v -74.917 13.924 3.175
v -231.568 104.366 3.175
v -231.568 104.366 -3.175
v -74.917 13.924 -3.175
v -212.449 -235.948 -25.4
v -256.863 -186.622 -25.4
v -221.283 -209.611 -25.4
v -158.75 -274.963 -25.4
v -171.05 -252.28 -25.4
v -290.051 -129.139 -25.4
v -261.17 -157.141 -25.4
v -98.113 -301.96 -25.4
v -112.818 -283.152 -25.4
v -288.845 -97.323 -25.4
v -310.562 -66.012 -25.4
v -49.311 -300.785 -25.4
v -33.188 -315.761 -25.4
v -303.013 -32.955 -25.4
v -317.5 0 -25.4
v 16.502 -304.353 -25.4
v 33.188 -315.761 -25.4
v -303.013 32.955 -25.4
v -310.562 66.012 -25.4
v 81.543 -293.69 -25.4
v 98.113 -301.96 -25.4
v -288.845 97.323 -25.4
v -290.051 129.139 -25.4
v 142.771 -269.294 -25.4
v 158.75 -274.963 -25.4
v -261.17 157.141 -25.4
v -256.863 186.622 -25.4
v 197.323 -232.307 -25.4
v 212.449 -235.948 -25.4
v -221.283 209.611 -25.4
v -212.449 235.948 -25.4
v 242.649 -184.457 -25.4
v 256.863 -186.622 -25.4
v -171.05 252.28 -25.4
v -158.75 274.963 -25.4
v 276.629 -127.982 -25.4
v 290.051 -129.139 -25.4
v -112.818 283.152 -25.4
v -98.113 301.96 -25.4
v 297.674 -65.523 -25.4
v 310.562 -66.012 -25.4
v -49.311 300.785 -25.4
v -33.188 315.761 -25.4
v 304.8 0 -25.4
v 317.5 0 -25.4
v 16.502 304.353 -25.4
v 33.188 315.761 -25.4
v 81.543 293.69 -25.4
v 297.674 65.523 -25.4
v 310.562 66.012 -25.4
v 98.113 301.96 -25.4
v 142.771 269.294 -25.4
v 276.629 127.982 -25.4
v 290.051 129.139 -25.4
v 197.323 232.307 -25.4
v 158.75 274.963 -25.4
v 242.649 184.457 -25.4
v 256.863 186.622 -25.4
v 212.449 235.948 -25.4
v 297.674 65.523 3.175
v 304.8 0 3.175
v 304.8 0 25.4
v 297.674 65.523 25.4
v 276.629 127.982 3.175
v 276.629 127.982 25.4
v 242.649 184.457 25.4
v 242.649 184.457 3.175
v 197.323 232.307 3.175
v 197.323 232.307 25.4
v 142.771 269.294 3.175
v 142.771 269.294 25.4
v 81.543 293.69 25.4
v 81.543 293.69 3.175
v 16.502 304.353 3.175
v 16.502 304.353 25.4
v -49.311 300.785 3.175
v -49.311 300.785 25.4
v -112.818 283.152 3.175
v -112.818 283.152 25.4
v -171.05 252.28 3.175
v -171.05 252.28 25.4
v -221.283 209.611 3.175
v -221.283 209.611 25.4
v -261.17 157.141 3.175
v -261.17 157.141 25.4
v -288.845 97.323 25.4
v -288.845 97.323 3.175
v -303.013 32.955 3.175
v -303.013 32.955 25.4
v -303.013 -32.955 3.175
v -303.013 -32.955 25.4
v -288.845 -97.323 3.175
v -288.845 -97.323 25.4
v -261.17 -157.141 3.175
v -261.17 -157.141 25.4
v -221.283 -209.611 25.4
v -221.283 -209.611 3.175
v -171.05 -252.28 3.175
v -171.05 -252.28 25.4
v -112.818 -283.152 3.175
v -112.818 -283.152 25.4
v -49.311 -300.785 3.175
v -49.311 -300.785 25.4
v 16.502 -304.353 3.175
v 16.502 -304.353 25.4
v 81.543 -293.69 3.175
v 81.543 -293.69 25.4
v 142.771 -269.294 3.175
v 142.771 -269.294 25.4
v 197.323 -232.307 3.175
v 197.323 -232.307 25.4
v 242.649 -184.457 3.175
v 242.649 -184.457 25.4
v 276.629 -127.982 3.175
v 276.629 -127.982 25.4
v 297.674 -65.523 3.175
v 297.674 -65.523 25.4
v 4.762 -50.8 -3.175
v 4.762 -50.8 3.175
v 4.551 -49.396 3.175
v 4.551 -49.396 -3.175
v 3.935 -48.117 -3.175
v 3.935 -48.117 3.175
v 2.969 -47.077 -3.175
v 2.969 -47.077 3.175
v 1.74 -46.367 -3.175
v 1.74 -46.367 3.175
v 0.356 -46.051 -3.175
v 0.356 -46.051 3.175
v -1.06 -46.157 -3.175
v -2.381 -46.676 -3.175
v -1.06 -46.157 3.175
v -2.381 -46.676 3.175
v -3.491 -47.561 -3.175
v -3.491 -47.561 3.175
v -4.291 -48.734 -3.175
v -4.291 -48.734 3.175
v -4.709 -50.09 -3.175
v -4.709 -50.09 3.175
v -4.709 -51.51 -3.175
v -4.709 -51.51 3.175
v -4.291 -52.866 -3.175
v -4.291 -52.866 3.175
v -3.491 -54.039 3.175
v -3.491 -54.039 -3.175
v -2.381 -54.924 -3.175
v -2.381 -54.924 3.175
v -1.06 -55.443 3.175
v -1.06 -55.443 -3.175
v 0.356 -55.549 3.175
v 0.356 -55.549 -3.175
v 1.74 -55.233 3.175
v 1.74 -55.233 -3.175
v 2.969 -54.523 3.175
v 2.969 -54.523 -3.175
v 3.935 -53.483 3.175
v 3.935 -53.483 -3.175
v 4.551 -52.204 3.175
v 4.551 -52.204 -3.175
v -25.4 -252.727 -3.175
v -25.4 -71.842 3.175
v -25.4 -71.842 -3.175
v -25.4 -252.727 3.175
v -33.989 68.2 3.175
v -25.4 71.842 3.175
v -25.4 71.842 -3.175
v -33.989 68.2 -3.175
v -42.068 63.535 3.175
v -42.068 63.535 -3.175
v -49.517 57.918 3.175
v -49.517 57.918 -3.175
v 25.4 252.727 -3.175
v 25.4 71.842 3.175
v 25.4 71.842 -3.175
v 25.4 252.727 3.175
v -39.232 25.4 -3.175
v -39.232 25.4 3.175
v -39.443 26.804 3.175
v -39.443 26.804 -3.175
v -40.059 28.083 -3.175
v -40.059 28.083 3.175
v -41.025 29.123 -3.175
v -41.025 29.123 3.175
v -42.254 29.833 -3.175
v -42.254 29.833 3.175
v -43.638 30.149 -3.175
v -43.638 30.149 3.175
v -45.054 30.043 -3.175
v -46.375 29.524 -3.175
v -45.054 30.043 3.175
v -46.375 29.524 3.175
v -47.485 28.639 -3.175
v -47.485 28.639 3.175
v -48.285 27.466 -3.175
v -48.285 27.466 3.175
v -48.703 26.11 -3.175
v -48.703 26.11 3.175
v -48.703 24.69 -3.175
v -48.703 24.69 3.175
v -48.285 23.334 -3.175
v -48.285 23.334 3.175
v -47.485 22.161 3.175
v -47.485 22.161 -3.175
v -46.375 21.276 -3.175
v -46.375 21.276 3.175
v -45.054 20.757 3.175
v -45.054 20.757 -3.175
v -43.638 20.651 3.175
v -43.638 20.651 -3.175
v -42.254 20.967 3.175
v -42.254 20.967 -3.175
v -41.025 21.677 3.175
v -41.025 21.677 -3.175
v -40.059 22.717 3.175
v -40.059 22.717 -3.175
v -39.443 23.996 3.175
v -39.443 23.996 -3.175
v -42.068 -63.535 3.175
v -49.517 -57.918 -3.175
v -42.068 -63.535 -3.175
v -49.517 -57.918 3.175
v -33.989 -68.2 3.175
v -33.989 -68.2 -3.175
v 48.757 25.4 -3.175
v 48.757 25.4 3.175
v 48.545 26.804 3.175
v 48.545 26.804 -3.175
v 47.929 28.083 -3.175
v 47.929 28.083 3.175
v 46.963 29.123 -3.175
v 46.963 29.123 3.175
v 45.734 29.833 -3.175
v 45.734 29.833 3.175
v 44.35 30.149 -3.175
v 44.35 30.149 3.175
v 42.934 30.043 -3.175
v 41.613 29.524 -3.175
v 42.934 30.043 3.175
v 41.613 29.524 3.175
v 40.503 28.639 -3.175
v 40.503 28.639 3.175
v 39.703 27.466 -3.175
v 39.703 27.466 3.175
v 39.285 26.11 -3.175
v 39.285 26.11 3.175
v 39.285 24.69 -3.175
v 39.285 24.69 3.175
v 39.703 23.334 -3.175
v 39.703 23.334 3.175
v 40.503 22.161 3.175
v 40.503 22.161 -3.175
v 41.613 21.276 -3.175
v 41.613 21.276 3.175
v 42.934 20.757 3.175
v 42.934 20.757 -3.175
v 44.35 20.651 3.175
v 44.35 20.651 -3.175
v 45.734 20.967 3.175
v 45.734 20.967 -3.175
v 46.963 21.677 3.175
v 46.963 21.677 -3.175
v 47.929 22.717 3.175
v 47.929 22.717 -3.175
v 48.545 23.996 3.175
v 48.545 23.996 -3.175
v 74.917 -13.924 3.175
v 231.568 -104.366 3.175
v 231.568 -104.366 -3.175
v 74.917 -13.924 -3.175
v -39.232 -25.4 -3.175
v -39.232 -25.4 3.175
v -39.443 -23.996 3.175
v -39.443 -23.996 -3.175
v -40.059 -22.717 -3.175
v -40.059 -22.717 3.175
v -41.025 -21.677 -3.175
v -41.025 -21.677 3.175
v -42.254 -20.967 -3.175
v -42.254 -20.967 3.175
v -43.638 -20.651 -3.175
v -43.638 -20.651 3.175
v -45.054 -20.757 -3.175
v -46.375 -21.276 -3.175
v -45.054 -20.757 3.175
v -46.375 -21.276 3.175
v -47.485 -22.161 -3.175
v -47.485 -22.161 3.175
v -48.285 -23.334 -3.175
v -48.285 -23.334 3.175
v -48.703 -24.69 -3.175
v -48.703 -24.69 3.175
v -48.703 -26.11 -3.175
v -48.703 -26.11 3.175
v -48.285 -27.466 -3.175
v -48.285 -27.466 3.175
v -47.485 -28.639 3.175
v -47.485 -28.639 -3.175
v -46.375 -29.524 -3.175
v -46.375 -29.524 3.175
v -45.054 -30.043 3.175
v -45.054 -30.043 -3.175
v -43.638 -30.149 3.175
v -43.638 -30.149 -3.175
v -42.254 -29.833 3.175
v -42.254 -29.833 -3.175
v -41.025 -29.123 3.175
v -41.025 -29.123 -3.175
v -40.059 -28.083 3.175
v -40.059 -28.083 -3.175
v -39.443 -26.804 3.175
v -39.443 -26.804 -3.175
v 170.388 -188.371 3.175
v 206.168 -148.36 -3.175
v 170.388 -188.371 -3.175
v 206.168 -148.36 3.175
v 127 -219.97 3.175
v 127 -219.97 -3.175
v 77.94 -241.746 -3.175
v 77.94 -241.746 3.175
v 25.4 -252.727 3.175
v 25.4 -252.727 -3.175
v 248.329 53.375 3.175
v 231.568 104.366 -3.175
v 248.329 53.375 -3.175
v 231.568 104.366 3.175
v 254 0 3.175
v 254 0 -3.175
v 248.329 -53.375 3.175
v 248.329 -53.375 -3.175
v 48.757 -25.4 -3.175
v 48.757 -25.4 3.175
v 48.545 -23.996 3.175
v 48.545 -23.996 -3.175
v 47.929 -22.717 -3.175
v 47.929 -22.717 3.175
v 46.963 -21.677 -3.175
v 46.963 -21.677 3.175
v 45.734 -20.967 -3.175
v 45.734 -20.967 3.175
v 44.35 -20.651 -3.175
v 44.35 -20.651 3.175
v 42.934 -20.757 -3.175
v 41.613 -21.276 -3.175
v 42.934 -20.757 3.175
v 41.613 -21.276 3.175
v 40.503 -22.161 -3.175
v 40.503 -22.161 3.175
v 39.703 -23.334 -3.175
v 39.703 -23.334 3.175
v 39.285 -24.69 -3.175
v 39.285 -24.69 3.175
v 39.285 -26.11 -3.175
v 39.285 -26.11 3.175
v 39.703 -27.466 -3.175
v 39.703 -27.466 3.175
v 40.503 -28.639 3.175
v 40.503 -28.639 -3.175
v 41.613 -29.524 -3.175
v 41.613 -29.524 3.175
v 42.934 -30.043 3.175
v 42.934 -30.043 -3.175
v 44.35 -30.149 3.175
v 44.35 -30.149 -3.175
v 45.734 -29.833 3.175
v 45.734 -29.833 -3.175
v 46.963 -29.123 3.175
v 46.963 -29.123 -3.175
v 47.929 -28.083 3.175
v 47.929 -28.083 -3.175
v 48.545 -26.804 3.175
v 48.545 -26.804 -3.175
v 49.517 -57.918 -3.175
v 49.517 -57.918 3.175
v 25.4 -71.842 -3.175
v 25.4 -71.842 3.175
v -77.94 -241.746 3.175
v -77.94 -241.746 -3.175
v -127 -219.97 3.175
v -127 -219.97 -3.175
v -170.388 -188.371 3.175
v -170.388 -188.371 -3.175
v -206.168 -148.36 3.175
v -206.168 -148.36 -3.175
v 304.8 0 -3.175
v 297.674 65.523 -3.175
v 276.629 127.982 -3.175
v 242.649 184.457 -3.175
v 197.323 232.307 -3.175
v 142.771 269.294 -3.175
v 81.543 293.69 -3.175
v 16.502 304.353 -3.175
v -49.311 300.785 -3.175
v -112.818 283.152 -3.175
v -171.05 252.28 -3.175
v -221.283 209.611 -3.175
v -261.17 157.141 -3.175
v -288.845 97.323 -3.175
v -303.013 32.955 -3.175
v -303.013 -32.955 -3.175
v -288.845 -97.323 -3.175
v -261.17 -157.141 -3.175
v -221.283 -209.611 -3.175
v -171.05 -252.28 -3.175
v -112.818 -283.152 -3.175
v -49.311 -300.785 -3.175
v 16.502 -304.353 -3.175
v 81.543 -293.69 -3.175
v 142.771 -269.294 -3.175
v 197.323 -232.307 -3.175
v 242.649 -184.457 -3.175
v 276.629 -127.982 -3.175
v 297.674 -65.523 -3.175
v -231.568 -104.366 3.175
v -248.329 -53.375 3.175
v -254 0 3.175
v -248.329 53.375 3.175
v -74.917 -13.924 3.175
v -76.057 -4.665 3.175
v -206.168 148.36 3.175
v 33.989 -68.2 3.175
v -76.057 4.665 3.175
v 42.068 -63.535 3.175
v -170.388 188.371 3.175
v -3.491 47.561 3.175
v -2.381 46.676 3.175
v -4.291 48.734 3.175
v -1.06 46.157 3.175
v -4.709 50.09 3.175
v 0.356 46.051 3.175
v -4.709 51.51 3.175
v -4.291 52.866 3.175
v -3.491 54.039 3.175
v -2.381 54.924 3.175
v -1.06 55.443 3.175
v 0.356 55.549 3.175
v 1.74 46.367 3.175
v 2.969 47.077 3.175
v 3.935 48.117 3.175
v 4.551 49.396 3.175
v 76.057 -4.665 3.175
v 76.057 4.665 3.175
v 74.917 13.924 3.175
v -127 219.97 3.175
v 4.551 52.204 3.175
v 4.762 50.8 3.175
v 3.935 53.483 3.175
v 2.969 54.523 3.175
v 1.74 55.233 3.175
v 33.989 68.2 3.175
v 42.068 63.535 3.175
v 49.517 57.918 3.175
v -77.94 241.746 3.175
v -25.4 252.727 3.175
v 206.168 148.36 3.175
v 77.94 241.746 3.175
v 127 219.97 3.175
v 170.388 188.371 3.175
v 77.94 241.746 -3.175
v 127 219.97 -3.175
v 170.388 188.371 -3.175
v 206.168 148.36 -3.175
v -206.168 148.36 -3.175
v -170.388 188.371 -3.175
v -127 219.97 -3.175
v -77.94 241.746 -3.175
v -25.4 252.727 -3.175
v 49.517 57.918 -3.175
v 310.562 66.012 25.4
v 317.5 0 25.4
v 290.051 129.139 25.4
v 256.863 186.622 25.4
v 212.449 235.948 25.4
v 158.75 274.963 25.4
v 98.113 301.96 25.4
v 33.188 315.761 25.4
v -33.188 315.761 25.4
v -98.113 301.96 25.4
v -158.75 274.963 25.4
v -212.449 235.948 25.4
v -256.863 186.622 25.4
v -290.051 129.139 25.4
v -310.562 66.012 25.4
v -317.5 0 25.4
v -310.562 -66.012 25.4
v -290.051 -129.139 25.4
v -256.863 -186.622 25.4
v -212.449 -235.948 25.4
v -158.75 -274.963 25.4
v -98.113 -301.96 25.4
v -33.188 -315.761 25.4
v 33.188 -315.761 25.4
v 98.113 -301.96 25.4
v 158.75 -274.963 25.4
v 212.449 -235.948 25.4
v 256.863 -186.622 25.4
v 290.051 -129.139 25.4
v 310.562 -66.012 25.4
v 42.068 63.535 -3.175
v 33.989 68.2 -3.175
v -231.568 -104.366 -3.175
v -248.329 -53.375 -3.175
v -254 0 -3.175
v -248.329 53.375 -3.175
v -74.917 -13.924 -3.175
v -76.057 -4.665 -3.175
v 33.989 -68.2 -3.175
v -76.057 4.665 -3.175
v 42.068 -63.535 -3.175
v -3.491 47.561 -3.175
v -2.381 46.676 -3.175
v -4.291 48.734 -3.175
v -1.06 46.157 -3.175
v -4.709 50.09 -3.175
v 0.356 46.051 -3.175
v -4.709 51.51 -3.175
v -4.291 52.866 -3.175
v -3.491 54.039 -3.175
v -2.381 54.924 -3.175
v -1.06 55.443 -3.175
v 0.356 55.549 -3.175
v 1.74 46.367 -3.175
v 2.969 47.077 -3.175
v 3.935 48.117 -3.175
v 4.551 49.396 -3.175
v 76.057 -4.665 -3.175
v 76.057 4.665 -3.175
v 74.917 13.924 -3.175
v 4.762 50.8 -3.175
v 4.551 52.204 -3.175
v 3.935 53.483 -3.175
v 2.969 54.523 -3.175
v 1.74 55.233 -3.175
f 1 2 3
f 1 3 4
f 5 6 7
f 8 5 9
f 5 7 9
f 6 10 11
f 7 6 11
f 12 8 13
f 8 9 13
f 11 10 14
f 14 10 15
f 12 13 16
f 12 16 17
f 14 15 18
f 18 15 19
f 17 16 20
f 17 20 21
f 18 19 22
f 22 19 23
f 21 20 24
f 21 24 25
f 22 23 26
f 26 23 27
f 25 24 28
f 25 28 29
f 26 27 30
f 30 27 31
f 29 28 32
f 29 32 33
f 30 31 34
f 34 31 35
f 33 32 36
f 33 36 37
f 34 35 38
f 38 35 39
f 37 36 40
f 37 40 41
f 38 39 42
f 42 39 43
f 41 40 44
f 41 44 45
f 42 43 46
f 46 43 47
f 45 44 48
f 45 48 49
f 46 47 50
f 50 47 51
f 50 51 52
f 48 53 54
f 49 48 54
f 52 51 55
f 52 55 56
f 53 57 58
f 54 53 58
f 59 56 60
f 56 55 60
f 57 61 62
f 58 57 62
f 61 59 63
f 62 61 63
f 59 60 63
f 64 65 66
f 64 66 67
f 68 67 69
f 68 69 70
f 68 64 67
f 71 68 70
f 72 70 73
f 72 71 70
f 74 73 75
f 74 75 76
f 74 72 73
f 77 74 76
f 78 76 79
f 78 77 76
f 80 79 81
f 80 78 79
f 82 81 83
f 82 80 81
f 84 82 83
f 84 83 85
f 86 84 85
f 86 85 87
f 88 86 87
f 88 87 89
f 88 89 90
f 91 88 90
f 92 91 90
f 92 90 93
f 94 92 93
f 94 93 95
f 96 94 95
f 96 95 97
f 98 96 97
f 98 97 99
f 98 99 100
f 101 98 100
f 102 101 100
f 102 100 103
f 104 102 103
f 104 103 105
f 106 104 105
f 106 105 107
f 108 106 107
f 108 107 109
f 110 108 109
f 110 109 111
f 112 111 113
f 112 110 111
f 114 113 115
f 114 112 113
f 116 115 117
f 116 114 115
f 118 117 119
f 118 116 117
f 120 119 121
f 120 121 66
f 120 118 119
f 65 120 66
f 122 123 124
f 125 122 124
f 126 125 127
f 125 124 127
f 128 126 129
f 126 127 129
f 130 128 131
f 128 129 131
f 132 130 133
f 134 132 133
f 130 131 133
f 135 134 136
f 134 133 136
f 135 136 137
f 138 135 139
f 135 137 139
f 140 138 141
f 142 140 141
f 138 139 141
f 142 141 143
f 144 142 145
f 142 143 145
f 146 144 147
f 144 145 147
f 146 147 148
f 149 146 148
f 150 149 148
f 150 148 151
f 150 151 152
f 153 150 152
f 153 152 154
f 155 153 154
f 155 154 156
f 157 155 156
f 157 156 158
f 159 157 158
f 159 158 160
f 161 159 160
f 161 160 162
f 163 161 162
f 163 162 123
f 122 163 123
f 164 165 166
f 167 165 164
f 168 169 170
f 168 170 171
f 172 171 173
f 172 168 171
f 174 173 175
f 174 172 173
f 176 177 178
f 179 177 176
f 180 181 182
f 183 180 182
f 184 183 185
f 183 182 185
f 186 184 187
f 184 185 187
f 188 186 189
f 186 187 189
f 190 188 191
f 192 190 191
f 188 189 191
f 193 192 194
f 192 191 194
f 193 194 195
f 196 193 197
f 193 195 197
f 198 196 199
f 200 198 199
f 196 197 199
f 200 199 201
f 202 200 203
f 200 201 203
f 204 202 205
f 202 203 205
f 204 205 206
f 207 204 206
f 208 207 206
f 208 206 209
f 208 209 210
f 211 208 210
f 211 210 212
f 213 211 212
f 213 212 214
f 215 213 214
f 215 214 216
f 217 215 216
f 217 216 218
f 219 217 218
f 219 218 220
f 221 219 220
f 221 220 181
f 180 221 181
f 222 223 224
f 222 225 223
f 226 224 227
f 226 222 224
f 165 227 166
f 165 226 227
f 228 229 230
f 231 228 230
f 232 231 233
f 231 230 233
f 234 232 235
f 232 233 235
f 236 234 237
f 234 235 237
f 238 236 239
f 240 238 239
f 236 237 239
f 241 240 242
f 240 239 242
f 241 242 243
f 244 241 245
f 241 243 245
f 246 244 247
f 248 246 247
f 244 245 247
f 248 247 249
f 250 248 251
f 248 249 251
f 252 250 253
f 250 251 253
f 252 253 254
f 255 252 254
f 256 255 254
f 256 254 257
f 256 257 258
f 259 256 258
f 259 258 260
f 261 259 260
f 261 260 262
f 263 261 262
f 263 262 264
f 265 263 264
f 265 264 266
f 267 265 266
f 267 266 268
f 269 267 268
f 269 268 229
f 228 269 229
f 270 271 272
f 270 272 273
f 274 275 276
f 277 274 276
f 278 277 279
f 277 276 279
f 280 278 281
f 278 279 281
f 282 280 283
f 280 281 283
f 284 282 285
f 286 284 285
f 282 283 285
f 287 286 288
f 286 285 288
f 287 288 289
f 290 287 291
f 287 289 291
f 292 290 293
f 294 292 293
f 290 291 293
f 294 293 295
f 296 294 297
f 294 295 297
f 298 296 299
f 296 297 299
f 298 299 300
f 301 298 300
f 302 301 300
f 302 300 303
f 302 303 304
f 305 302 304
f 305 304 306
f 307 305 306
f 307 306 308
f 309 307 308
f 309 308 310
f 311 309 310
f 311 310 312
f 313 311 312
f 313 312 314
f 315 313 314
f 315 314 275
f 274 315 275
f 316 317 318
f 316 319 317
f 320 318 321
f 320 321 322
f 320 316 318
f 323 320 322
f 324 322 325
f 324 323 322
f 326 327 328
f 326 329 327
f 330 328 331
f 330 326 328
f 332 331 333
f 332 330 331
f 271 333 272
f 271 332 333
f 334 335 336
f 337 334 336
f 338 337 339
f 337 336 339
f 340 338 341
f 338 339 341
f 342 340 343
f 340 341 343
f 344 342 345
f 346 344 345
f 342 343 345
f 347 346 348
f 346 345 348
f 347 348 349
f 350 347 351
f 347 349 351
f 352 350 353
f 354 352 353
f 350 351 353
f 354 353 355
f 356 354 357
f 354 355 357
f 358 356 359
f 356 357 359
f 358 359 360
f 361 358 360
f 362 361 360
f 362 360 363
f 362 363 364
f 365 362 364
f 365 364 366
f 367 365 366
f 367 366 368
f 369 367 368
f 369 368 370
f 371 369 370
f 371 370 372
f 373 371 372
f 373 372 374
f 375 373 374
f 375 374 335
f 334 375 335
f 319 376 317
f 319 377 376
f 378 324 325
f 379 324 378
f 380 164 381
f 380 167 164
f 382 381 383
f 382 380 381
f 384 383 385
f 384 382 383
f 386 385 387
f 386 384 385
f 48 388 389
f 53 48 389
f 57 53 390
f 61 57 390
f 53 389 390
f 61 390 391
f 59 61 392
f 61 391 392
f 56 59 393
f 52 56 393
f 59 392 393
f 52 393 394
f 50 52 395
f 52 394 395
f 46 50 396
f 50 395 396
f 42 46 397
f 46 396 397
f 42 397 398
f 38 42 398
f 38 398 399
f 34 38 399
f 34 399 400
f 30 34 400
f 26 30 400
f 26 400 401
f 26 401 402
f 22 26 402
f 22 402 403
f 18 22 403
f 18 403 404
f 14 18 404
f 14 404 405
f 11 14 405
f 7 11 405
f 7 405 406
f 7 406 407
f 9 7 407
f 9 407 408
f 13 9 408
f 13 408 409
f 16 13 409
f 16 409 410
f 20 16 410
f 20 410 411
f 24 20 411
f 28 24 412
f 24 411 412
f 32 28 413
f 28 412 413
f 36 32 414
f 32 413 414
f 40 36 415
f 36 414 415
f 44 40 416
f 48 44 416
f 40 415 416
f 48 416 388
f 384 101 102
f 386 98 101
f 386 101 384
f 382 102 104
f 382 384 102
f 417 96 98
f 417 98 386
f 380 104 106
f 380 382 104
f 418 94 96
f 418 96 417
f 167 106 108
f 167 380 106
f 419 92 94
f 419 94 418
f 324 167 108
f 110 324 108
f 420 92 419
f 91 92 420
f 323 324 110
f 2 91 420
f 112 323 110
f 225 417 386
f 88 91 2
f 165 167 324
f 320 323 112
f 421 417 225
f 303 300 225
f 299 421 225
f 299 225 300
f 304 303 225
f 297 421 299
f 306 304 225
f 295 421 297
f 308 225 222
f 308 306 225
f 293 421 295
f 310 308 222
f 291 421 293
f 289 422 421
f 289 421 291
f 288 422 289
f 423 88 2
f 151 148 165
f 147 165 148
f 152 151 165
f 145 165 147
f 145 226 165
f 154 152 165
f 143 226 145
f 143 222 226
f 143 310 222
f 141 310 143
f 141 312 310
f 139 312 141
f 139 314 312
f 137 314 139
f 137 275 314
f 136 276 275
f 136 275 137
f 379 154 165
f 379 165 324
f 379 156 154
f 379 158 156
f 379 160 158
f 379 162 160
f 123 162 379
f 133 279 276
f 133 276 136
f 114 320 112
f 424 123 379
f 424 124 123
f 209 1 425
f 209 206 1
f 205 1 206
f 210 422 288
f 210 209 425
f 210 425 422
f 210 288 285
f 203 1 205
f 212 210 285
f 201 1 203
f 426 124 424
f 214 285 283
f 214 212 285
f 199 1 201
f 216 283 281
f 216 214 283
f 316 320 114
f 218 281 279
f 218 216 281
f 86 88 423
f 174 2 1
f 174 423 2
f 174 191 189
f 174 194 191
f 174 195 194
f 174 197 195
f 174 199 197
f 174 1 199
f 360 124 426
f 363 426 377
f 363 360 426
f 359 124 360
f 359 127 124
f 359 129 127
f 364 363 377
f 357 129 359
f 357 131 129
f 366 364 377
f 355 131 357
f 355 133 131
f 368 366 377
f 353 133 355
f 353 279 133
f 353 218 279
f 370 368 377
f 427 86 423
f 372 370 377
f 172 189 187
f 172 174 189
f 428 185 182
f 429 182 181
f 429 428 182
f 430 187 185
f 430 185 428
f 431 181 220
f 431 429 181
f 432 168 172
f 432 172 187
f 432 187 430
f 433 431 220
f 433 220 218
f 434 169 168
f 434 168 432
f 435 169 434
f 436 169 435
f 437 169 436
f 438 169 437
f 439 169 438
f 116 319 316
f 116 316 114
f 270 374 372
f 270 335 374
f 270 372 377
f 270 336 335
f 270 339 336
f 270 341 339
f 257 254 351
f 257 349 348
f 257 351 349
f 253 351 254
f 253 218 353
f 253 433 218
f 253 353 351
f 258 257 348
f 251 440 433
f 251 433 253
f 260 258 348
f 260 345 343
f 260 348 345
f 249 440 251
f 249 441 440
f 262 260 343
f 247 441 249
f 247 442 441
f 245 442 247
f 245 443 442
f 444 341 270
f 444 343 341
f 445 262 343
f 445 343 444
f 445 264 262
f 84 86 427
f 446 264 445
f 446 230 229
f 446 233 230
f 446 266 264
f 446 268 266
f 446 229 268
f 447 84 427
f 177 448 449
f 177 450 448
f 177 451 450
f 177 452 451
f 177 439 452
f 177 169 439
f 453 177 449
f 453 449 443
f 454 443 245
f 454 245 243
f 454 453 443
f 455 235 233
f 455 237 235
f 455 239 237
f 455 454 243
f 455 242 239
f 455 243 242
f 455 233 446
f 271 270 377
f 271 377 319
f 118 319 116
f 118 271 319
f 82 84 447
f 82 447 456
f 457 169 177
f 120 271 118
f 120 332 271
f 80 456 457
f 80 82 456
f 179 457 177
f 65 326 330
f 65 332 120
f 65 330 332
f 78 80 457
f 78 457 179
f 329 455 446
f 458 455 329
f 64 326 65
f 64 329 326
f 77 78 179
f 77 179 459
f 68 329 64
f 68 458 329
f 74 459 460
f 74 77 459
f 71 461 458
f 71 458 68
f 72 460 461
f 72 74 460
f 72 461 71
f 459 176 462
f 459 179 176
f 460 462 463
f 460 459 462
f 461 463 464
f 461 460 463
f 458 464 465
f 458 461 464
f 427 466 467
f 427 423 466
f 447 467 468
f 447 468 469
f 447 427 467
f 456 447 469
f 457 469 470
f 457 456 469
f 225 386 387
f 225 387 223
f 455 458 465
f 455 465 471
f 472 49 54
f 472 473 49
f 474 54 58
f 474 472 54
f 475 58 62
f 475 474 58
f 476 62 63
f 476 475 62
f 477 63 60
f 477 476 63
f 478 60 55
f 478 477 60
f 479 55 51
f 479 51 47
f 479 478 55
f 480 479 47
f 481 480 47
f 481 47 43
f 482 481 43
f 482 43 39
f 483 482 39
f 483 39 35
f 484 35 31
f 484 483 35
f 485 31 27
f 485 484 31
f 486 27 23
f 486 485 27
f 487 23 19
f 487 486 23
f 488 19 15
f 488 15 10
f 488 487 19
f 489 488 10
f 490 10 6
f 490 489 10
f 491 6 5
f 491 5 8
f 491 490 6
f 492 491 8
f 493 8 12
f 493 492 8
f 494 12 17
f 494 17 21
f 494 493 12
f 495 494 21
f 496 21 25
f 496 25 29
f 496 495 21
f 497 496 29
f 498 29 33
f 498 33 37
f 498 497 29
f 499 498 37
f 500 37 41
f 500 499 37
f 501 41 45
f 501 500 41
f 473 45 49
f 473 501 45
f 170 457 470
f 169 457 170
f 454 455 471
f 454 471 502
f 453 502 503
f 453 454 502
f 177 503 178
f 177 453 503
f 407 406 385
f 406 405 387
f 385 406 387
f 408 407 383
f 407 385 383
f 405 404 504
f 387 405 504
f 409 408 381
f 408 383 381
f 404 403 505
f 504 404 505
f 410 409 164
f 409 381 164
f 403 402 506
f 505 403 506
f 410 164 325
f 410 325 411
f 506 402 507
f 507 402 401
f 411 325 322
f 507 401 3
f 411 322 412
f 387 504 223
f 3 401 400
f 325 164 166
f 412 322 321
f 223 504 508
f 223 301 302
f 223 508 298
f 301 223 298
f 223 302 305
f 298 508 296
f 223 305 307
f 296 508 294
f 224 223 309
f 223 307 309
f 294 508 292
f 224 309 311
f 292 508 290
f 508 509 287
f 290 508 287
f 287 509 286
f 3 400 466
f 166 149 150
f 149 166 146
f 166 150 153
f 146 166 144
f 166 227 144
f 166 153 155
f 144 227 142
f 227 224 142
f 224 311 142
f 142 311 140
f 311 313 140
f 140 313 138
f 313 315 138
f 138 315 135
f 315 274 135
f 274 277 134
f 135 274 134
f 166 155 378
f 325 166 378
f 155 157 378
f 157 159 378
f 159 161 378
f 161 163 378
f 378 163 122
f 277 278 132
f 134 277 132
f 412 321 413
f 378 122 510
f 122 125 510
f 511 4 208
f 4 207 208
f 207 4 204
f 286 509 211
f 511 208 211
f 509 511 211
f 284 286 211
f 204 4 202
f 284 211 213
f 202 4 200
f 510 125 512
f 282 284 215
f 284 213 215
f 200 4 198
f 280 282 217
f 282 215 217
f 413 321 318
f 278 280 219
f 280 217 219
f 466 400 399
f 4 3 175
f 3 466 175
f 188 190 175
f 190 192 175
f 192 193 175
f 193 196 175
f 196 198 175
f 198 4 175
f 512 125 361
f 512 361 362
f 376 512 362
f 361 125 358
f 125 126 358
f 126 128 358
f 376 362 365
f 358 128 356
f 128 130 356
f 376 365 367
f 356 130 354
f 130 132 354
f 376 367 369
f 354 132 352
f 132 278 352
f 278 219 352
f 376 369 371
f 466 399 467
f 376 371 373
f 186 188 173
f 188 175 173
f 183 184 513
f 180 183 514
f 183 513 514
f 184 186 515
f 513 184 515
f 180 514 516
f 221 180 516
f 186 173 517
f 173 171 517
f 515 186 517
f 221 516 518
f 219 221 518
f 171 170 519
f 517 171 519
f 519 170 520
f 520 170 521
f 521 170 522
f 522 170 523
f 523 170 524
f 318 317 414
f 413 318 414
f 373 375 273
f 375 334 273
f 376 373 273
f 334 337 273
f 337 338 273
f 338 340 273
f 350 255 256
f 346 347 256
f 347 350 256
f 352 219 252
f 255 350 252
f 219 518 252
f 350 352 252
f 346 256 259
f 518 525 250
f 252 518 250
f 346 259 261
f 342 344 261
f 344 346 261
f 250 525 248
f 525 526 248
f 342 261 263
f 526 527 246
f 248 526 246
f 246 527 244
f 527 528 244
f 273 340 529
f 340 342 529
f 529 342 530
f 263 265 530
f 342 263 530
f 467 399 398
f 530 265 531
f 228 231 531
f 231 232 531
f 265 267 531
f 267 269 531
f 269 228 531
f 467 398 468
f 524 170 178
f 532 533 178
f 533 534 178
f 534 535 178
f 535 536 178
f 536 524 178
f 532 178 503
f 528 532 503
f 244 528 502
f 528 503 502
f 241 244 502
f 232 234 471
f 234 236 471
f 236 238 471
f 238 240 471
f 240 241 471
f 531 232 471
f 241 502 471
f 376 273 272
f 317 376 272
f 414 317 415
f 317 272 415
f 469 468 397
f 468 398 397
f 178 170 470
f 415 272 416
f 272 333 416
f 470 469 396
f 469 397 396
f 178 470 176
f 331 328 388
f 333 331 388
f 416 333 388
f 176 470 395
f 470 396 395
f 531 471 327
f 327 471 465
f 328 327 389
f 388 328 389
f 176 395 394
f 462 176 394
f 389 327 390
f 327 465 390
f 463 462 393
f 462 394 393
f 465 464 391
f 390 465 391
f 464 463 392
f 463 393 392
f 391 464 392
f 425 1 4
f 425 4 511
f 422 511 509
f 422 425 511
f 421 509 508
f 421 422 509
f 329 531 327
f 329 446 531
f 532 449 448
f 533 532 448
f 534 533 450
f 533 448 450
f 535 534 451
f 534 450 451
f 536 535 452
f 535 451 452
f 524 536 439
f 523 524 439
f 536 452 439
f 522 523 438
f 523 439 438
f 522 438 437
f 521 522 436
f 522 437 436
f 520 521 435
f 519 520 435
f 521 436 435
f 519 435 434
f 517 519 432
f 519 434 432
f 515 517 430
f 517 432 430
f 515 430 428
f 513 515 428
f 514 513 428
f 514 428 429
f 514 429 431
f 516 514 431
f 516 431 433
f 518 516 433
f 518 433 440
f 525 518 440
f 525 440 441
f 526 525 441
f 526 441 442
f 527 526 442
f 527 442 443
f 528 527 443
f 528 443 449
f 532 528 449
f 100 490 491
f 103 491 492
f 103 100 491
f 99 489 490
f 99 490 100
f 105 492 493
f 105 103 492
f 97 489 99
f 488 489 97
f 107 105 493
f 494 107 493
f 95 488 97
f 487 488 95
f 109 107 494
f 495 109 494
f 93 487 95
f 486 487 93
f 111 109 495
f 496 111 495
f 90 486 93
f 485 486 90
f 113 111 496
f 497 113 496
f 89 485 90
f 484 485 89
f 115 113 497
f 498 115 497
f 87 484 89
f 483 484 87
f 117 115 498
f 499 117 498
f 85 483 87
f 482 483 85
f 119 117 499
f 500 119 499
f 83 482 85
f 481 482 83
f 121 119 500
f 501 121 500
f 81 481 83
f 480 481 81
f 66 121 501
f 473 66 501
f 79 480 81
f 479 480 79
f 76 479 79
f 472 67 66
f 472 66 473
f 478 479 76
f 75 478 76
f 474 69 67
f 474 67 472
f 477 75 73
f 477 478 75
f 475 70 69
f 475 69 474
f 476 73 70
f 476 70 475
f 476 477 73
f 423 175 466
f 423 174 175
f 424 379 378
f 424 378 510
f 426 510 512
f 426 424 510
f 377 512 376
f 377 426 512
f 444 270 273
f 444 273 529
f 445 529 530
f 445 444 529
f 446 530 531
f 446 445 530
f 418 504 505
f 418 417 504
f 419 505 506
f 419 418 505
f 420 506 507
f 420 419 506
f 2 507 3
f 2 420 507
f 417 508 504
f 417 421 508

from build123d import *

# Parameters (mm, degrees)
BOSS_EXTRUDE1_DEPTH      = 3.175
BOSS_EXTRUDE1_DEPTH_BACK = 3.175
SKETCH2_R                = 304.8
BOSS_EXTRUDE2_DEPTH      = 25.4
BOSS_EXTRUDE2_DEPTH_BACK = 25.4
SKETCH5_R                = 317.5
SKETCH5_R_2              = 304.8
SKETCH6_R                = 4.7625
CUT_EXTRUDE4_DEPTH       = 450.921138229


with BuildPart() as part:
    # Sketch2 → Boss-Extrude1 (new, two sides: drawn at the far end of the back side and taken through both)
    with BuildSketch(Plane.XY.offset(-BOSS_EXTRUDE1_DEPTH_BACK)):
        Circle(SKETCH2_R)
        with BuildLine():
            ThreePointArc((25.4, -71.842048969), (38.1, -65.991135768), (49.517039467, -57.91806974))
            Line((49.517039467, -57.91806974), (206.167836833, -148.360449769))
            ThreePointArc((206.167836833, -148.360449769), (127, -219.970452561), (25.4, -252.726809025))
            Line((25.4, -252.726809025), (25.4, -71.842048969))
        make_face(mode=Mode.SUBTRACT)
        with BuildLine():
            ThreePointArc((-49.517039467, -57.91806974), (-38.1, -65.991135768), (-25.4, -71.842048969))
            Line((-25.4, -71.842048969), (-25.4, -252.726809025))
            ThreePointArc((-25.4, -252.726809025), (-127, -219.970452561), (-206.167836833, -148.360449769))
            Line((-206.167836833, -148.360449769), (-49.517039467, -57.91806974))
        make_face(mode=Mode.SUBTRACT)
        with BuildLine():
            ThreePointArc((-74.917039467, 13.923979228), (-76.2, 0), (-74.917039467, -13.923979228))
            Line((-74.917039467, -13.923979228), (-231.567836833, -104.366359256))
            ThreePointArc((-231.567836833, -104.366359256), (-254, 0), (-231.567836833, 104.366359256))
            Line((-231.567836833, 104.366359256), (-74.917039467, 13.923979228))
        make_face(mode=Mode.SUBTRACT)
        with BuildLine():
            ThreePointArc((-25.4, 71.842048969), (-38.1, 65.991135768), (-49.517039467, 57.91806974))
            Line((-49.517039467, 57.91806974), (-206.167836833, 148.360449769))
            ThreePointArc((-206.167836833, 148.360449769), (-127, 219.970452561), (-25.4, 252.726809025))
            Line((-25.4, 252.726809025), (-25.4, 71.842048969))
        make_face(mode=Mode.SUBTRACT)
        with BuildLine():
            ThreePointArc((49.517039467, 57.91806974), (38.1, 65.991135768), (25.4, 71.842048969))
            Line((25.4, 71.842048969), (25.4, 252.726809025))
            ThreePointArc((25.4, 252.726809025), (127, 219.970452561), (206.167836833, 148.360449769))
            Line((206.167836833, 148.360449769), (49.517039467, 57.91806974))
        make_face(mode=Mode.SUBTRACT)
        with BuildLine():
            Line((74.917039467, 13.923979228), (231.567836833, 104.366359256))
            ThreePointArc((231.567836833, 104.366359256), (254, 0), (231.567836833, -104.366359256))
            Line((231.567836833, -104.366359256), (74.917039467, -13.923979228))
            ThreePointArc((74.917039467, -13.923979228), (76.2, 0), (74.917039467, 13.923979228))
        make_face(mode=Mode.SUBTRACT)
    extrude(amount=BOSS_EXTRUDE1_DEPTH + BOSS_EXTRUDE1_DEPTH_BACK)

    # Sketch5 → Boss-Extrude2 (add, two sides: drawn at the far end of the back side and taken through both)
    with BuildSketch(Plane.XY.offset(-BOSS_EXTRUDE2_DEPTH_BACK)):
        Circle(SKETCH5_R)
        Circle(SKETCH5_R_2, mode=Mode.SUBTRACT)
    extrude(amount=BOSS_EXTRUDE2_DEPTH + BOSS_EXTRUDE2_DEPTH_BACK)

    # Sketch6 → Cut-Extrude4 (cut, through all)
    with BuildSketch(Plane.XY.offset(3.175)):
        with Locations((0, 50.8)):
            Circle(SKETCH6_R)
        with Locations((43.994090512, 25.4)):
            Circle(SKETCH6_R)
        with Locations((43.994090512, -25.4)):
            Circle(SKETCH6_R)
        with Locations((0, -50.8)):
            Circle(SKETCH6_R)
        with Locations((-43.994090512, -25.4)):
            Circle(SKETCH6_R)
        with Locations((-43.994090512, 25.4)):
            Circle(SKETCH6_R)
    extrude(amount=-CUT_EXTRUDE4_DEPTH, mode=Mode.SUBTRACT)


solid = part.part
